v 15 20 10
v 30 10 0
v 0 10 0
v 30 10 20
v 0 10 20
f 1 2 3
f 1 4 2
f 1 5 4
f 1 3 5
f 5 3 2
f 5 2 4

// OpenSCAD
// Generated by SolidPython 1.1.3 on 2022-10-27 10:20:26


polyhedron(convexity = 10, faces = [[0, 1, 4], [1, 2, 4], [2, 3, 4], [3, 0, 4], [1, 0, 3], [2, 1, 3]], points = [[0, 10, 0], [30, 10, 0], [30, 10, 20], [0, 10, 20], [15.0000000000, 20, 10.0000000000]]);
